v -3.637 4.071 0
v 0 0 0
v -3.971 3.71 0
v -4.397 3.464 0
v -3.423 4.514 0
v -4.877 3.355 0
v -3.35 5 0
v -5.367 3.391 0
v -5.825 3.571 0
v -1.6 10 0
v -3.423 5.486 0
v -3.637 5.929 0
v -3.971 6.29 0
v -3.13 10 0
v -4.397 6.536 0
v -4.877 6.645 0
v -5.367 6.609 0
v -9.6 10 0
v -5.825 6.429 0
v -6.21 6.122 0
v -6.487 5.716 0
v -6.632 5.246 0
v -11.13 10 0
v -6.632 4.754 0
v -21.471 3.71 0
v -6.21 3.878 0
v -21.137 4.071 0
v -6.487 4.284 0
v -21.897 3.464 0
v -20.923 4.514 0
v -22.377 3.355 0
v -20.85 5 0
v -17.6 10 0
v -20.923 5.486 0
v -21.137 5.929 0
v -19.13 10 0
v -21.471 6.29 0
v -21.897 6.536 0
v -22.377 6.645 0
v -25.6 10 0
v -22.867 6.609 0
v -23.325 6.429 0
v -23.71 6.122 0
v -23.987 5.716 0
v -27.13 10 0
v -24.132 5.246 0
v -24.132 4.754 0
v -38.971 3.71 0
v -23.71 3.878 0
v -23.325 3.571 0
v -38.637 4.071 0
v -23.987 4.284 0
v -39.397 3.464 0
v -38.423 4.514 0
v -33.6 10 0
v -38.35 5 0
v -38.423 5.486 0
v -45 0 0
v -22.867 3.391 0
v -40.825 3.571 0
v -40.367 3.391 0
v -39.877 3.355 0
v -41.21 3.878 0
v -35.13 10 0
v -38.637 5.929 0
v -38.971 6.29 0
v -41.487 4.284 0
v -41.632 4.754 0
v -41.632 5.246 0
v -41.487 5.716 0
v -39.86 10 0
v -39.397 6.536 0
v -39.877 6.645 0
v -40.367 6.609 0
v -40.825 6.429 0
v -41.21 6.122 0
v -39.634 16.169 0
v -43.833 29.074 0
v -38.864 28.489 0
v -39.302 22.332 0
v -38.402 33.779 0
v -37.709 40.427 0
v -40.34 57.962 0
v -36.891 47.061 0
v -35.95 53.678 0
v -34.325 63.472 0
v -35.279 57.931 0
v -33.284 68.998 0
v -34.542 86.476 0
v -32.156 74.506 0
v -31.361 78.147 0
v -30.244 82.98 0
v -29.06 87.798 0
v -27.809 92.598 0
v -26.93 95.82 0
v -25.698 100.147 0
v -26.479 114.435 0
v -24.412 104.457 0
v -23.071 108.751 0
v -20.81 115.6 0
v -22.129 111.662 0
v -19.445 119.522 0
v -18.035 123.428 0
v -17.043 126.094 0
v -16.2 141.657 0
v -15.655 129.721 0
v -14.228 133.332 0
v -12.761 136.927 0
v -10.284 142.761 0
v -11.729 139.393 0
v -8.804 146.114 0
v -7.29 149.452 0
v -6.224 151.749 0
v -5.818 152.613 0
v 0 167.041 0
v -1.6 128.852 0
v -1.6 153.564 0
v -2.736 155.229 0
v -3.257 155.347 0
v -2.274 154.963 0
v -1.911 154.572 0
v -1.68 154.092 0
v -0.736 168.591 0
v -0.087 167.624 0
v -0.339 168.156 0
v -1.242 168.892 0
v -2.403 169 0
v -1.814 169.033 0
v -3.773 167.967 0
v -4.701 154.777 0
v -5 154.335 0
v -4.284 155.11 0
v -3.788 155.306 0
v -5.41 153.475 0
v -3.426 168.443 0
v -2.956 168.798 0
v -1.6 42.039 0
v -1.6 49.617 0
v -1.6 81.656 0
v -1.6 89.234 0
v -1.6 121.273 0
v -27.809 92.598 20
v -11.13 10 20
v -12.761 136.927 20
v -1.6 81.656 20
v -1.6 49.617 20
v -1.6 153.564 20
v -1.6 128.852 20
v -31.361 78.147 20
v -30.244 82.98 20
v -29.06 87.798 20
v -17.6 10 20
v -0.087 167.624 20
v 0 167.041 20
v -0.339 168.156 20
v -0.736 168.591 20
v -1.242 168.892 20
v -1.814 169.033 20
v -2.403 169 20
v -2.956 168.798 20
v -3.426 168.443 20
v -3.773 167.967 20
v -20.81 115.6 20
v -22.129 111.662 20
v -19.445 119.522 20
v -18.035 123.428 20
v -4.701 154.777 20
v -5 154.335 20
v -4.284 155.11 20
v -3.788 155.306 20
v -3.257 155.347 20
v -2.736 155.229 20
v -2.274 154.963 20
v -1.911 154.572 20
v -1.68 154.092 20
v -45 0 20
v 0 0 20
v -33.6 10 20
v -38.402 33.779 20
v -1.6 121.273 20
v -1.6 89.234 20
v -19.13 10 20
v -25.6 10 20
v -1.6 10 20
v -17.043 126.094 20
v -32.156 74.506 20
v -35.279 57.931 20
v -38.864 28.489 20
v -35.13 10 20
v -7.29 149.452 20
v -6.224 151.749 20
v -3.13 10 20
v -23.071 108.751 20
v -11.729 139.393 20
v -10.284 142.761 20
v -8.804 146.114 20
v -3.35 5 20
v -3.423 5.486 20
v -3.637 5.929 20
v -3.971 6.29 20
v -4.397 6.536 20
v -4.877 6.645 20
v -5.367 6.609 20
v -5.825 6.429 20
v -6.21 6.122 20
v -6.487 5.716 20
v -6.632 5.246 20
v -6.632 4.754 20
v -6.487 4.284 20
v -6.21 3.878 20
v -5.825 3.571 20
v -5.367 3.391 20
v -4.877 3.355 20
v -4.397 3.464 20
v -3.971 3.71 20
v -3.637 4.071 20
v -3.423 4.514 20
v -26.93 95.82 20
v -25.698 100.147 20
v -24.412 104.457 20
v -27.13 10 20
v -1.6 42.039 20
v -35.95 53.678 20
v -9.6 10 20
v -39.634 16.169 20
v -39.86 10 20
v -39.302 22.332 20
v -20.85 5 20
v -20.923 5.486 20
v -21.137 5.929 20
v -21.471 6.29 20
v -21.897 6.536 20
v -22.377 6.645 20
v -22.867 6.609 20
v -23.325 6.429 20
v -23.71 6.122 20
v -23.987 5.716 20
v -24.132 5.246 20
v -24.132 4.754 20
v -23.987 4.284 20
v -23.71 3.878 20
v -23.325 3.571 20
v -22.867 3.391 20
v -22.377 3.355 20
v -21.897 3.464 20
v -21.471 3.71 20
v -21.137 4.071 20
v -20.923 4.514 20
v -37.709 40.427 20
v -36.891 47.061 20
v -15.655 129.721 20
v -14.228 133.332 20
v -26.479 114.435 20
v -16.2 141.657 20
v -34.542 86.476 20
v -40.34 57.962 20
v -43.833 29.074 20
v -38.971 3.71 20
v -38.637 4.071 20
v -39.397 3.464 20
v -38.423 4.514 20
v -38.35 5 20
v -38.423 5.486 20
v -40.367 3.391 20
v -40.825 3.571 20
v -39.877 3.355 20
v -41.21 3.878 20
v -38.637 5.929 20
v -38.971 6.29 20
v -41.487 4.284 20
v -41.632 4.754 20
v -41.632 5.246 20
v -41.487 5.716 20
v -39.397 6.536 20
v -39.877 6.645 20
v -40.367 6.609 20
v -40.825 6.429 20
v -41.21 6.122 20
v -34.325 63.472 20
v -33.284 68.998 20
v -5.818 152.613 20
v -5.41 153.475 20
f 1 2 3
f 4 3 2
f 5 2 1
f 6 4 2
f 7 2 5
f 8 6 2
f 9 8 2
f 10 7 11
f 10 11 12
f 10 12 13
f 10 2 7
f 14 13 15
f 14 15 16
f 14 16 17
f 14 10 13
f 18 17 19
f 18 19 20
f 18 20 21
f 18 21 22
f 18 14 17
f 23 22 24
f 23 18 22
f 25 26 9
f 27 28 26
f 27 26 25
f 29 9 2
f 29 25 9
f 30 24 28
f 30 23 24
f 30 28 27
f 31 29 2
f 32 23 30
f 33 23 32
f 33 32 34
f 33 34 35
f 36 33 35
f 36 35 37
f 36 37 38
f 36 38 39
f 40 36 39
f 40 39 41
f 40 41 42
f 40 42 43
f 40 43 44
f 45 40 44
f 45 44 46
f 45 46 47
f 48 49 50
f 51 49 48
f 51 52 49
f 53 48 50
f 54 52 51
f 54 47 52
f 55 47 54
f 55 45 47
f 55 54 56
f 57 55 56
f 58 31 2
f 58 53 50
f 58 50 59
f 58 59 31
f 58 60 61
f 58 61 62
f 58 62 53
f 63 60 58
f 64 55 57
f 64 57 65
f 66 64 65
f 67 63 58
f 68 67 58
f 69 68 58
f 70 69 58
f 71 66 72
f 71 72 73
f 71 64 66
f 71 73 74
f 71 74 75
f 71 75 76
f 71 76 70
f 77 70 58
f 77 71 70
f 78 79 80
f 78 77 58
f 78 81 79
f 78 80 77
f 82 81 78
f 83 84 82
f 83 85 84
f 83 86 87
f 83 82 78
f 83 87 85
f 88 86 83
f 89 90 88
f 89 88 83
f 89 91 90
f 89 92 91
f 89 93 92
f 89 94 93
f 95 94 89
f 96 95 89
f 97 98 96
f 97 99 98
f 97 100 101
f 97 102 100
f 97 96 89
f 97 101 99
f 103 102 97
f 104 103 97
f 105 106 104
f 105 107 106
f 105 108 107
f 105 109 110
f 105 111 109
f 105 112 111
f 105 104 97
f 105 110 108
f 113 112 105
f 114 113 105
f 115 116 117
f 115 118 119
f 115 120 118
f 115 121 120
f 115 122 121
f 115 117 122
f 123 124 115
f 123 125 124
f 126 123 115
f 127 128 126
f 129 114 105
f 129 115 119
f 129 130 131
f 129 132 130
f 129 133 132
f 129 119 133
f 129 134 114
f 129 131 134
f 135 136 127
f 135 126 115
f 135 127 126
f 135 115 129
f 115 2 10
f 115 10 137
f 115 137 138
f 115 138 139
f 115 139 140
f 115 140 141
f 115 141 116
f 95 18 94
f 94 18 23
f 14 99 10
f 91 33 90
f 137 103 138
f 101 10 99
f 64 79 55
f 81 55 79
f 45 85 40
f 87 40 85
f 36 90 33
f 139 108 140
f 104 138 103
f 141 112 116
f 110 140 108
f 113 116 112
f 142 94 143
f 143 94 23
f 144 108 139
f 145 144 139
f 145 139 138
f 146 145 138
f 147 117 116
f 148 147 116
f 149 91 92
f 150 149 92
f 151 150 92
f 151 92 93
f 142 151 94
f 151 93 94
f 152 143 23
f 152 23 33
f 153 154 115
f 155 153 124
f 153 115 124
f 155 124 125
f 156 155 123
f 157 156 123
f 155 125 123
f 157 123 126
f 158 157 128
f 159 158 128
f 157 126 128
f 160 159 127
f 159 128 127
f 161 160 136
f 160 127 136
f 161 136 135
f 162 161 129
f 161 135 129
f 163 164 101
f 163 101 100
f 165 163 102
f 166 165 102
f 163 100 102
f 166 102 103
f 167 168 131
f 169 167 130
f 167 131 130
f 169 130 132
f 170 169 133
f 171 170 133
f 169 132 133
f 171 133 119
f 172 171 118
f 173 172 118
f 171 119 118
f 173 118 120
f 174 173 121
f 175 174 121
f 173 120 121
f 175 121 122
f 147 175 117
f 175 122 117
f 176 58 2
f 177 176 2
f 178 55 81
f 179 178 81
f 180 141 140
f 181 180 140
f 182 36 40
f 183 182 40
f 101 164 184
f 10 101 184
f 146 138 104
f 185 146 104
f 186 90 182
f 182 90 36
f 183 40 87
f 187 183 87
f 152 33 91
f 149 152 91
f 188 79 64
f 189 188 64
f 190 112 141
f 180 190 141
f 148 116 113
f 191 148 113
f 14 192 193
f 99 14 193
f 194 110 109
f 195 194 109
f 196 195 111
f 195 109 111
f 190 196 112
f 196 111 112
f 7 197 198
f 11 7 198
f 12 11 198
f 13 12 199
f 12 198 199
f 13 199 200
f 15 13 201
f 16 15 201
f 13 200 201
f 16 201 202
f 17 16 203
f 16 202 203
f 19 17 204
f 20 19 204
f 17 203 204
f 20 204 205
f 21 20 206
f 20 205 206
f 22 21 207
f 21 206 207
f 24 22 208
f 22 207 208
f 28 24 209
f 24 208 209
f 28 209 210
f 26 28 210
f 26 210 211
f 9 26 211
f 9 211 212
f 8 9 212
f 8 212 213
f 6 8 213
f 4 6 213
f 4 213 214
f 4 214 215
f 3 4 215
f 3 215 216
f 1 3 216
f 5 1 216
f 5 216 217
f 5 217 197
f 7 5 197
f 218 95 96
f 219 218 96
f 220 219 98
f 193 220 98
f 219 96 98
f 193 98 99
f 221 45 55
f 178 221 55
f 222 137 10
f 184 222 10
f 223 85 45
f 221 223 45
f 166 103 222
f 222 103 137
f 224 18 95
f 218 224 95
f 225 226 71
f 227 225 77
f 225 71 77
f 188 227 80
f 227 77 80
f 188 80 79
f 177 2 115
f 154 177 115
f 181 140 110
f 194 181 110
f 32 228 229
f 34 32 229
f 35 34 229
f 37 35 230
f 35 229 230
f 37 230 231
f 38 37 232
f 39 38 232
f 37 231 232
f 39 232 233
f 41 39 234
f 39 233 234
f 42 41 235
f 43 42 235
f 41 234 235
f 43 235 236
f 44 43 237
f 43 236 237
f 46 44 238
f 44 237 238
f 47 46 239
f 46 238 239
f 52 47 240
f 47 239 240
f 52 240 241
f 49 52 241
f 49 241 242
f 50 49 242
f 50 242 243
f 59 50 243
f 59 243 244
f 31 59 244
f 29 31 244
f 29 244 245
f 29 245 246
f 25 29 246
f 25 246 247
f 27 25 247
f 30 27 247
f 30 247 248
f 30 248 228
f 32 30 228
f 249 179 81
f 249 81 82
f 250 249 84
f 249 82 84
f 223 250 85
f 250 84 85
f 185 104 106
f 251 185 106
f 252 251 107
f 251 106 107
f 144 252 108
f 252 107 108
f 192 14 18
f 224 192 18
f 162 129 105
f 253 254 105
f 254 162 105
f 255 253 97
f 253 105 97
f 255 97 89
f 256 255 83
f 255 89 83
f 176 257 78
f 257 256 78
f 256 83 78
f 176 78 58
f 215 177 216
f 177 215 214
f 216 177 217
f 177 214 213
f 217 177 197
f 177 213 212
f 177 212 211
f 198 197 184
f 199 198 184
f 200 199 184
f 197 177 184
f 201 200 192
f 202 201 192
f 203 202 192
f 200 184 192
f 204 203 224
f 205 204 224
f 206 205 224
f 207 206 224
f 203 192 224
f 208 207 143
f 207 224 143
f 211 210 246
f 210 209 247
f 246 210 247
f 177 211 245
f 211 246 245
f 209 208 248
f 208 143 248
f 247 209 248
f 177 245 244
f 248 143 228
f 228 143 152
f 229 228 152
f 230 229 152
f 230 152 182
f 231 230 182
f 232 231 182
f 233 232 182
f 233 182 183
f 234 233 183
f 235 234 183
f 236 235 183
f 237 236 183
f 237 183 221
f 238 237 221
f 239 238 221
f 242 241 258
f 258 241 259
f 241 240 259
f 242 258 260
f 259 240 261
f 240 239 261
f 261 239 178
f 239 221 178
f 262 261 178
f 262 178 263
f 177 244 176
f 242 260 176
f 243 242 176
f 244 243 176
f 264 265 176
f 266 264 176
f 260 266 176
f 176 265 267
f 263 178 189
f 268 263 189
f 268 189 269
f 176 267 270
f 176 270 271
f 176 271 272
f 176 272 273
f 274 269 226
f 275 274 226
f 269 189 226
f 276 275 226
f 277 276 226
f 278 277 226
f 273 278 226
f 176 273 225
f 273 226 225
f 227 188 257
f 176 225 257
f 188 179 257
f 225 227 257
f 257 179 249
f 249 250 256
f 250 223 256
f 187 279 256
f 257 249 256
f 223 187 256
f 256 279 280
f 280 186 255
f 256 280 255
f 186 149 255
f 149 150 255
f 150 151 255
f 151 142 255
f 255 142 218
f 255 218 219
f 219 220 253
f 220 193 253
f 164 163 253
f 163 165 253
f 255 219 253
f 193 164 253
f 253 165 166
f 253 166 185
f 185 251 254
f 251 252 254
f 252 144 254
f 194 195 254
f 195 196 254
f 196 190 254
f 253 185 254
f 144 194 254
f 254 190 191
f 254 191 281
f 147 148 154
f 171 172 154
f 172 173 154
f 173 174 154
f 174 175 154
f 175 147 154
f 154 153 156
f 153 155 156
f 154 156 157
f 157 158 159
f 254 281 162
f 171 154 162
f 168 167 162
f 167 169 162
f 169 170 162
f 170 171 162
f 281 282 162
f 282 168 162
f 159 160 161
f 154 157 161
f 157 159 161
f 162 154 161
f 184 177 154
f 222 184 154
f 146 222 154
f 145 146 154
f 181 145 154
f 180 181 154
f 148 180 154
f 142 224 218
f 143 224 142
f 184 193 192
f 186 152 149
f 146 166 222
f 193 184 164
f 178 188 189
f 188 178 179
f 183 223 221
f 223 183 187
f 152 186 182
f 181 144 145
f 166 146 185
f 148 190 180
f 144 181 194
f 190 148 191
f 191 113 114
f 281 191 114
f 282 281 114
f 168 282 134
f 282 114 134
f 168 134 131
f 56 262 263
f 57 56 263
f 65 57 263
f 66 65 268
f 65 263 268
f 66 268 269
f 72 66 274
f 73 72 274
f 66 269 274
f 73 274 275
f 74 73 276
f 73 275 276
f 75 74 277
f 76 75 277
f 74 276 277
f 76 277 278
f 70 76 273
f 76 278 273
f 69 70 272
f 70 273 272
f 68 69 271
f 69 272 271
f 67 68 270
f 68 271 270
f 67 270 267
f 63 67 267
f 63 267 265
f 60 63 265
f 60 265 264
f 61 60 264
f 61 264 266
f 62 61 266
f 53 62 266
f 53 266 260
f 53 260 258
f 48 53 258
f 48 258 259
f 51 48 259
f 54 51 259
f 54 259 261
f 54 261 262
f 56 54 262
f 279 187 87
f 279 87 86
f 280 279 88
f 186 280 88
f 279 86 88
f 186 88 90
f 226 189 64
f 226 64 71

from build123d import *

# Parameters (mm, degrees)
BOSS_EXTRUDE4_DEPTH = 20
SKETCH12_R          = 1.65
CUT_EXTRUDE1_DEPTH  = 177.068006068
BOSS_EXTRUDE5_DEPTH = 20
CUT_EXTRUDE2_START  = -20
CUT_EXTRUDE2_DEPTH  = 20
LPATTERN2_DEPTH     = 20
CUT_EXTRUDE4_START  = -30
CUT_EXTRUDE4_DEPTH  = 30


with BuildPart() as part:
    # Sketch5 → Boss-Extrude4 (new body)
    with BuildSketch(Plane.XY):
        with BuildLine():
            Line((0, 0), (0, 167.041245738))
            ThreePointArc((0, 167.041245738), (-1.523254023, 168.9835931), (-3.772713274, 167.967252028))
            ThreePointArc((-3.772713274, 167.967252028), (-34.542452011, 86.476422979), (-45, 0))
            Line((-45, 0), (0, 0))
        make_face()
        with BuildLine():
            Line((-1.6, 10), (-39.860221142, 10))
            ThreePointArc((-39.860221142, 10), (-30.000299364, 83.996114978), (-5, 154.335493145))
            ThreePointArc((-5, 154.335493145), (-2.992115624, 155.307611869), (-1.6, 153.56444562))
            Line((-1.6, 153.56444562), (-1.6, 10))
        make_face(mode=Mode.SUBTRACT)
    extrude(amount=BOSS_EXTRUDE4_DEPTH)

    # Sketch12 → Cut-Extrude1 (cut, through all)
    with BuildSketch(Plane.XY.offset(20)):
        with Locations((-40, 5)):
            Circle(SKETCH12_R)
        with Locations((-22.5, 5)):
            Circle(SKETCH12_R)
        with Locations((-5, 5)):
            Circle(SKETCH12_R)
    extrude(amount=-CUT_EXTRUDE1_DEPTH, mode=Mode.SUBTRACT)

    # Sketch14 → Boss-Extrude5 (add)
    with BuildSketch(Plane.XY.offset(20)):
        Polygon((-31.6, 158.56444562), (-1.6, 10), (-3.070322034, 9.703094096), (-33.070322034, 158.267539717), align=None)
    extrude(amount=-BOSS_EXTRUDE5_DEPTH)

    # Sketch17 → Cut-Extrude2 (cut)
    with BuildSketch(Plane.XY.offset(20).offset(CUT_EXTRUDE2_START)):
        Polygon((-120.638203698, 868.825955305), (-109.129206393, -31.174044695), (790.870793607, -19.66504739), (784.13367644, 507.175413991), align=None)
        with BuildLine():
            Line((-45, 0), (0, 0))
            Line((0, 0), (0, 167.041245738))
            ThreePointArc((0, 167.041245738), (-1.523254023, 168.9835931), (-3.772713274, 167.967252028))
            ThreePointArc((-3.772713274, 167.967252028), (-34.542452011, 86.476422979), (-45, 0))
        make_face(mode=Mode.SUBTRACT)
    extrude(amount=CUT_EXTRUDE2_DEPTH, mode=Mode.SUBTRACT)

    # LPattern2: read off the stored shape, not the designer's step
    # LPattern2 outline → LPattern2 (add)
    with BuildSketch(Plane.XY):
        with BuildLine():
            ThreePointArc((-26.929923269, 95.820348103), (-27.373467662, 94.210169532), (-27.809490726, 92.59793799))
            Line((-27.809490726, 92.59793799), (-11.130277006, 10))
            Line((-11.130277006, 10), (-9.6, 10))
            Line((-9.6, 10), (-26.929923269, 95.820348103))
        make_face()
        with BuildLine():
            Line((-17.6, 10), (-31.361118804, 78.147099536))
            ThreePointArc((-31.361118804, 78.147099536), (-31.763386373, 76.327667567), (-32.156172589, 74.506165199))
            Line((-32.156172589, 74.506165199), (-19.130277006, 10))
            Line((-19.130277006, 10), (-17.6, 10))
        make_face()
        with BuildLine():
            Line((-25.6, 10), (-35.278805908, 57.930881129))
            ThreePointArc((-35.278805908, 57.930881129), (-35.62097033, 55.805583127), (-35.950341194, 53.67826488))
            Line((-35.950341194, 53.67826488), (-27.130277006, 10))
            Line((-27.130277006, 10), (-25.6, 10))
        make_face()
        with BuildLine():
            Line((-33.6, 10), (-38.401810118, 33.779275272))
            ThreePointArc((-38.401810118, 33.779275272), (-38.642670237, 31.135229386), (-38.863902948, 28.489468942))
            Line((-38.863902948, 28.489468942), (-35.130277006, 10))
            Line((-35.130277006, 10), (-33.6, 10))
        make_face()
        with BuildLine():
            Line((-39.6, 158.56444562), (-41.070322034, 158.267539717))
            Line((-41.070322034, 158.267539717), (-29.975183074, 103.322767425))
            ThreePointArc((-29.975183074, 103.322767425), (-29.520039112, 104.842464839), (-29.058254032, 106.360157429))
            Line((-29.058254032, 106.360157429), (-39.6, 158.56444562))
        make_face()
        with BuildLine():
            Line((-9.070322034, 158.267539717), (-8.948336076, 157.663447176))
            ThreePointArc((-8.948336076, 157.663447176), (-8.779938618, 158.011942308), (-8.611169445, 158.360257578))
            Line((-8.611169445, 158.360257578), (-9.070322034, 158.267539717))
        make_face()
        with BuildLine():
            Line((-17.070322034, 158.267539717), (-14.508363766, 145.580342723))
            ThreePointArc((-14.508363766, 145.580342723), (-13.985146964, 146.768790335), (-13.457679601, 147.955357539))
            Line((-13.457679601, 147.955357539), (-15.6, 158.56444562))
            Line((-15.6, 158.56444562), (-17.070322034, 158.267539717))
        make_face()
        with BuildLine():
            Line((-25.070322034, 158.267539717), (-19.890886638, 132.618208106))
            ThreePointArc((-19.890886638, 132.618208106), (-19.386082828, 133.896404549), (-18.876440608, 135.172679536))
            Line((-18.876440608, 135.172679536), (-23.6, 158.56444562))
            Line((-23.6, 158.56444562), (-25.070322034, 158.267539717))
        make_face()
        with BuildLine():
            ThreePointArc((-42.198101589, 45.000914697), (-41.903670312, 47.296637828), (-41.594598358, 49.590435769))
            Line((-41.594598358, 49.590435769), (-63.6, 158.56444562))
            Line((-63.6, 158.56444562), (-65.070322034, 158.267539717))
            Line((-65.070322034, 158.267539717), (-42.198101589, 45.000914697))
        make_face()
        with BuildLine():
            ThreePointArc((-38.7019538, 67.304658261), (-38.331864724, 69.236107391), (-37.951310909, 71.165521929))
            Line((-37.951310909, 71.165521929), (-55.6, 158.56444562))
            Line((-55.6, 158.56444562), (-57.070322034, 158.267539717))
            Line((-57.070322034, 158.267539717), (-38.7019538, 67.304658261))
        make_face()
        with BuildLine():
            ThreePointArc((-34.559404558, 86.407326039), (-34.139952511, 88.100097378), (-33.712367751, 89.79083275))
            Line((-33.712367751, 89.79083275), (-47.6, 158.56444562))
            Line((-47.6, 158.56444562), (-49.070322034, 158.267539717))
            Line((-49.070322034, 158.267539717), (-34.559404558, 86.407326039))
        make_face()
        with BuildLine():
            ThreePointArc((-17.043254073, 126.094468165), (-17.541868523, 124.762466617), (-18.035183962, 123.428493465))
            Line((-18.035183962, 123.428493465), (-1.6, 42.039026998))
            Line((-1.6, 42.039026998), (-1.6, 49.617185499))
            Line((-1.6, 49.617185499), (-17.043254073, 126.094468165))
        make_face()
        with BuildLine():
            ThreePointArc((-11.728678792, 139.39308932), (-12.247145872, 138.161094529), (-12.761006653, 136.927171366))
            Line((-12.761006653, 136.927171366), (-1.6, 81.656212497))
            Line((-1.6, 81.656212497), (-1.6, 89.234370998))
            Line((-1.6, 89.234370998), (-11.728678792, 139.39308932))
        make_face()
        with BuildLine():
            ThreePointArc((-6.2238307, 151.749451318), (-6.759005375, 150.601509463), (-7.290112892, 149.451680241))
            Line((-7.290112892, 149.451680241), (-1.6, 121.273397996))
            Line((-1.6, 121.273397996), (-1.6, 128.851556496))
            Line((-1.6, 128.851556496), (-6.2238307, 151.749451318))
        make_face()
        Polygon((0, 41.693748399), (0, 34.115589899), (4.929677966, 9.703094096), (6.4, 10), align=None)
        Polygon((0, 158.483672593), (0, 152.967146395), (28.929677966, 9.703094096), (30.4, 10), (0.4, 158.56444562), align=None)
        Polygon((0, 120.928119397), (0, 113.349960896), (20.929677966, 9.703094096), (22.4, 10), align=None)
        Polygon((0, 81.310933898), (0, 73.732775397), (12.929677966, 9.703094096), (14.4, 10), align=None)
    extrude(amount=LPATTERN2_DEPTH)

    # Sketch19 → Cut-Extrude4 (cut)
    with BuildSketch(Plane.XY.offset(20).offset(CUT_EXTRUDE4_START)):
        Polygon((-113.909990018, -19.131609845), (183.246695872, -29.17634289), (134.697152825, 220.267861041), (-171.248674479, 235.334960607), align=None)
        with BuildLine():
            Line((-45, 0), (0, 0))
            Line((0, 0), (0, 167.041245738))
            ThreePointArc((0, 167.041245738), (-1.523254023, 168.9835931), (-3.772713274, 167.967252028))
            ThreePointArc((-3.772713274, 167.967252028), (-34.542452011, 86.476422979), (-45, 0))
        make_face(mode=Mode.SUBTRACT)
    extrude(amount=CUT_EXTRUDE4_DEPTH, mode=Mode.SUBTRACT)


solid = part.part
